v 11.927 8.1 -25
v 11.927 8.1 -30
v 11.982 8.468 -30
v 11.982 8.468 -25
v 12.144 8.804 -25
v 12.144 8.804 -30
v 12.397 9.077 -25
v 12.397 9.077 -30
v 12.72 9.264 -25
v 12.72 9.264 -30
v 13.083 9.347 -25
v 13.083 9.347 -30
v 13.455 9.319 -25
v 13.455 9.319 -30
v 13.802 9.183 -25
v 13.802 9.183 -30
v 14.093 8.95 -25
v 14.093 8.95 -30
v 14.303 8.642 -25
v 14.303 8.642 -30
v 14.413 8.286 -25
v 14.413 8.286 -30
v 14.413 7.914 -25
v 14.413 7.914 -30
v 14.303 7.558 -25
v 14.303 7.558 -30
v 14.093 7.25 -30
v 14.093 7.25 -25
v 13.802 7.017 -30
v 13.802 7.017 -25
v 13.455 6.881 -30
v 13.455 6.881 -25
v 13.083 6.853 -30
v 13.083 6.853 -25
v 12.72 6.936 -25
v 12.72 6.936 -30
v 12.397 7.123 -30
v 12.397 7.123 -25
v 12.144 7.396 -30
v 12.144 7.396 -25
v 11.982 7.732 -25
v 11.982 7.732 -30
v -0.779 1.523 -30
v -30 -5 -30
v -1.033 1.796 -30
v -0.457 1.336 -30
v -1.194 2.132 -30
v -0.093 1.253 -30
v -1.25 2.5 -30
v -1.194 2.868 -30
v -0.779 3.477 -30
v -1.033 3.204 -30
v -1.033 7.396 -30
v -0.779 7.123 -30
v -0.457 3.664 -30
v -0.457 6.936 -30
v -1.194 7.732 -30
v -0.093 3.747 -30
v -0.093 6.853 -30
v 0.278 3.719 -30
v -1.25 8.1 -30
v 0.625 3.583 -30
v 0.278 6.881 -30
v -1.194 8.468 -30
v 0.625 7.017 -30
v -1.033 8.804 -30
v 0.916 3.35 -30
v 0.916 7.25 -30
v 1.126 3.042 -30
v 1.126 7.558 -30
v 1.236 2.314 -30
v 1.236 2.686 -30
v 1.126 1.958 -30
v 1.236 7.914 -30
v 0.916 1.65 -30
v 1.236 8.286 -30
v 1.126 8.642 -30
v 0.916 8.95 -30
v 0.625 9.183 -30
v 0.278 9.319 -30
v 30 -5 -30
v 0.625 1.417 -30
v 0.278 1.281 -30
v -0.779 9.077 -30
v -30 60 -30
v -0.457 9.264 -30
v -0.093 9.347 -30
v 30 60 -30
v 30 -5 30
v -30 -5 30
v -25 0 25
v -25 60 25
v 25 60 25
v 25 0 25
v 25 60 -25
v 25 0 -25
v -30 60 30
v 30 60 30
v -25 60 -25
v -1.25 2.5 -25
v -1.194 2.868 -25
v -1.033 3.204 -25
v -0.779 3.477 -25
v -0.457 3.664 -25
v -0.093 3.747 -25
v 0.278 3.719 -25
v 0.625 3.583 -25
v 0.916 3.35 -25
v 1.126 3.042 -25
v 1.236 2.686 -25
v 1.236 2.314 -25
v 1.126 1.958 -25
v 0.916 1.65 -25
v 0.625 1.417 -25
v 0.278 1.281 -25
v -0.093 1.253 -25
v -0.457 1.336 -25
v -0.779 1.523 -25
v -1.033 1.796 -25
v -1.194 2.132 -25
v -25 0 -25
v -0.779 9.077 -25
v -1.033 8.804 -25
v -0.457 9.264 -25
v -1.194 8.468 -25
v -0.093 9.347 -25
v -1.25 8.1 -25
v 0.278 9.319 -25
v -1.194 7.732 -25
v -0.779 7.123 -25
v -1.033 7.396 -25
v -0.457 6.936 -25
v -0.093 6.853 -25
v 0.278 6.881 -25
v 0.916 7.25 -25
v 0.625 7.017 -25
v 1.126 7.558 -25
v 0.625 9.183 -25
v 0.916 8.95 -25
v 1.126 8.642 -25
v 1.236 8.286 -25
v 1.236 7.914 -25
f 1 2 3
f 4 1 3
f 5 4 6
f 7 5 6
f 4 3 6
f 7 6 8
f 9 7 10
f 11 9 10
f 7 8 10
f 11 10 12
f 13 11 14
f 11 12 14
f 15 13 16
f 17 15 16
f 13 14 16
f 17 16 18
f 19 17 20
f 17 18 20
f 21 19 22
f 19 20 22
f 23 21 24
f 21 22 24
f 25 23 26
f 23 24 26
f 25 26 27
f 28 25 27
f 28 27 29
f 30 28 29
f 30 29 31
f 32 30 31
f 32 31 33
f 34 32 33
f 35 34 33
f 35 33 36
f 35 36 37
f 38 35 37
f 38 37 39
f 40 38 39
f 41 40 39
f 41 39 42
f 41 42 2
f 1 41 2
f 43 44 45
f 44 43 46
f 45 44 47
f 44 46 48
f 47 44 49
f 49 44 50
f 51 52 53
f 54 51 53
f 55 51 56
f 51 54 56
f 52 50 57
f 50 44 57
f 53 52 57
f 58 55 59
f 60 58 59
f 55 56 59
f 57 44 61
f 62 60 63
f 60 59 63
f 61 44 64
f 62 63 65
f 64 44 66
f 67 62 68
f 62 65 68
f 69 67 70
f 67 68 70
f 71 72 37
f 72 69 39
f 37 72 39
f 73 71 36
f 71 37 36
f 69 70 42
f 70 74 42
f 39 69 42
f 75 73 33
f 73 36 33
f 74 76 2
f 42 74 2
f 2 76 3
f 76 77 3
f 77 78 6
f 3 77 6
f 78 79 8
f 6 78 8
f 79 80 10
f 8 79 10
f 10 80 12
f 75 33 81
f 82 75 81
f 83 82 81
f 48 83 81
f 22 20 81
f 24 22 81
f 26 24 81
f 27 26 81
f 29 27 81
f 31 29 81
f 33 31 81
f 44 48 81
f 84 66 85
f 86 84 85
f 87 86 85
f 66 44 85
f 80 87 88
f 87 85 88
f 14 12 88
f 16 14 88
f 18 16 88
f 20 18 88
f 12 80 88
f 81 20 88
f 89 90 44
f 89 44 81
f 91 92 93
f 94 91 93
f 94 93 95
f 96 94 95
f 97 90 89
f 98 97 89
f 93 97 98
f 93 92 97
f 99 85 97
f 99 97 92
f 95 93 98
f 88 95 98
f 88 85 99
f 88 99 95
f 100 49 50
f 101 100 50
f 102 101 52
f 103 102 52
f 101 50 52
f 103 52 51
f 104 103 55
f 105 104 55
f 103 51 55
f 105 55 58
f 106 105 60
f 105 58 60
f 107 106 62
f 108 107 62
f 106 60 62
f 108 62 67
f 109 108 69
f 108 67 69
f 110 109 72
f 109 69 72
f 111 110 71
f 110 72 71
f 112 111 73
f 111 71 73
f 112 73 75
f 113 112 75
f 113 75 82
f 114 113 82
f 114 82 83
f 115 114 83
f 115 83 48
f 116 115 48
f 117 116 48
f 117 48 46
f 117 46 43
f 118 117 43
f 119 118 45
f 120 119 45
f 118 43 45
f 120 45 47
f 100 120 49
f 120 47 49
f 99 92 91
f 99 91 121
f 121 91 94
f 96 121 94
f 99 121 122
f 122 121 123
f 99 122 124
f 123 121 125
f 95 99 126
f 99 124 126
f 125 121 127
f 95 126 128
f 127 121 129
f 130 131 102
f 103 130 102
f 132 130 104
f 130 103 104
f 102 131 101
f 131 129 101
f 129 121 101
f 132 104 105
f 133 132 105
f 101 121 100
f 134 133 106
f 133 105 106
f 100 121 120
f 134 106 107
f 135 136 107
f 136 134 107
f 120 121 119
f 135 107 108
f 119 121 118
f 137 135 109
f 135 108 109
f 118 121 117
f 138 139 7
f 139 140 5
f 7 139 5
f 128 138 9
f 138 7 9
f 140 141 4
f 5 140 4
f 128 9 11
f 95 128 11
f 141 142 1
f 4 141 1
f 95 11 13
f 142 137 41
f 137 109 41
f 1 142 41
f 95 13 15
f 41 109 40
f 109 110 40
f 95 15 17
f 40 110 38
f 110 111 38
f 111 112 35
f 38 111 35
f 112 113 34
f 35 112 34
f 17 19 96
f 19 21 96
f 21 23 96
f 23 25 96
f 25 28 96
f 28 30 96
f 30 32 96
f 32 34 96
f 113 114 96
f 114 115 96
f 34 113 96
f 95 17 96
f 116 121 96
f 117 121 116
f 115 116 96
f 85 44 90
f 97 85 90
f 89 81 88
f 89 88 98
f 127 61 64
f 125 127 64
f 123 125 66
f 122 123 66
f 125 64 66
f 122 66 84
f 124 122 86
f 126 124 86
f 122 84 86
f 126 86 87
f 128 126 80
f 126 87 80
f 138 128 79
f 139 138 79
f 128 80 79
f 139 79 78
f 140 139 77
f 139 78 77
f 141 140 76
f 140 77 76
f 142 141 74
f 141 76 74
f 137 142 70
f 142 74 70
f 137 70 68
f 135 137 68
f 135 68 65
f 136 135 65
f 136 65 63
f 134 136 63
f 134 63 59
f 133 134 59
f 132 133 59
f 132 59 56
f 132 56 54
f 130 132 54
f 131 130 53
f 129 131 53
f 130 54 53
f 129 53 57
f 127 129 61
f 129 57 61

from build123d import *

# Parameters (mm, degrees)
SKETCH1_W           = 60
SKETCH1_H           = 60
SKETCH1_W_2         = 50
SKETCH1_H_2         = 50
BOSS_EXTRUDE1_DEPTH = 60
SKETCH2_W           = 60
SKETCH2_H           = 60
BOSS_EXTRUDE2_DEPTH = 5
SKETCH3_R           = 1.25
CUT_EXTRUDE1_DEPTH  = 5
CUT_EXTRUDE2_REACH  = 62
SKETCH4_R           = 1.25


with BuildPart() as part:
    # Sketch1 → Boss-Extrude1 (new body)
    with BuildSketch(Plane(origin=(0, 0, 0), x_dir=(1, 0, 0), z_dir=(0, 1, 0))):
        Rectangle(SKETCH1_W, SKETCH1_H)
        Rectangle(SKETCH1_W_2, SKETCH1_H_2, mode=Mode.SUBTRACT)
    extrude(amount=BOSS_EXTRUDE1_DEPTH)

    # Sketch2 → Boss-Extrude2 (add)
    with BuildSketch(Plane.XZ):
        Rectangle(SKETCH2_W, SKETCH2_H)
    extrude(amount=BOSS_EXTRUDE2_DEPTH)

    # Sketch3 → Cut-Extrude1 (cut)
    with BuildSketch(Plane(origin=(0, 0, -30), x_dir=(-1, 0, 0), z_dir=(0, 0, -1))):
        with Locations((0, 2.5)):
            Circle(SKETCH3_R)
        with Locations((0, 8.1)):
            Circle(SKETCH3_R)
    extrude(amount=-CUT_EXTRUDE1_DEPTH, mode=Mode.SUBTRACT)

    # Sketch4 → Cut-Extrude2 (cut, up to next)
    with BuildSketch(Plane(origin=(0, 0, -30), x_dir=(-1, 0, 0), z_dir=(0, 0, -1)), mode=Mode.PRIVATE) as cut_extrude2_sk1:
        with Locations((-13.176528006, 8.1)):
            Circle(SKETCH4_R)
    cut_extrude2_tool1 = extrude(cut_extrude2_sk1.sketch, amount=-CUT_EXTRUDE2_REACH, mode=Mode.PRIVATE) & part.part
    add(cut_extrude2_tool1.solids().sort_by_distance((13.176528, 8.1, -30))[0], mode=Mode.SUBTRACT)


solid = part.part
